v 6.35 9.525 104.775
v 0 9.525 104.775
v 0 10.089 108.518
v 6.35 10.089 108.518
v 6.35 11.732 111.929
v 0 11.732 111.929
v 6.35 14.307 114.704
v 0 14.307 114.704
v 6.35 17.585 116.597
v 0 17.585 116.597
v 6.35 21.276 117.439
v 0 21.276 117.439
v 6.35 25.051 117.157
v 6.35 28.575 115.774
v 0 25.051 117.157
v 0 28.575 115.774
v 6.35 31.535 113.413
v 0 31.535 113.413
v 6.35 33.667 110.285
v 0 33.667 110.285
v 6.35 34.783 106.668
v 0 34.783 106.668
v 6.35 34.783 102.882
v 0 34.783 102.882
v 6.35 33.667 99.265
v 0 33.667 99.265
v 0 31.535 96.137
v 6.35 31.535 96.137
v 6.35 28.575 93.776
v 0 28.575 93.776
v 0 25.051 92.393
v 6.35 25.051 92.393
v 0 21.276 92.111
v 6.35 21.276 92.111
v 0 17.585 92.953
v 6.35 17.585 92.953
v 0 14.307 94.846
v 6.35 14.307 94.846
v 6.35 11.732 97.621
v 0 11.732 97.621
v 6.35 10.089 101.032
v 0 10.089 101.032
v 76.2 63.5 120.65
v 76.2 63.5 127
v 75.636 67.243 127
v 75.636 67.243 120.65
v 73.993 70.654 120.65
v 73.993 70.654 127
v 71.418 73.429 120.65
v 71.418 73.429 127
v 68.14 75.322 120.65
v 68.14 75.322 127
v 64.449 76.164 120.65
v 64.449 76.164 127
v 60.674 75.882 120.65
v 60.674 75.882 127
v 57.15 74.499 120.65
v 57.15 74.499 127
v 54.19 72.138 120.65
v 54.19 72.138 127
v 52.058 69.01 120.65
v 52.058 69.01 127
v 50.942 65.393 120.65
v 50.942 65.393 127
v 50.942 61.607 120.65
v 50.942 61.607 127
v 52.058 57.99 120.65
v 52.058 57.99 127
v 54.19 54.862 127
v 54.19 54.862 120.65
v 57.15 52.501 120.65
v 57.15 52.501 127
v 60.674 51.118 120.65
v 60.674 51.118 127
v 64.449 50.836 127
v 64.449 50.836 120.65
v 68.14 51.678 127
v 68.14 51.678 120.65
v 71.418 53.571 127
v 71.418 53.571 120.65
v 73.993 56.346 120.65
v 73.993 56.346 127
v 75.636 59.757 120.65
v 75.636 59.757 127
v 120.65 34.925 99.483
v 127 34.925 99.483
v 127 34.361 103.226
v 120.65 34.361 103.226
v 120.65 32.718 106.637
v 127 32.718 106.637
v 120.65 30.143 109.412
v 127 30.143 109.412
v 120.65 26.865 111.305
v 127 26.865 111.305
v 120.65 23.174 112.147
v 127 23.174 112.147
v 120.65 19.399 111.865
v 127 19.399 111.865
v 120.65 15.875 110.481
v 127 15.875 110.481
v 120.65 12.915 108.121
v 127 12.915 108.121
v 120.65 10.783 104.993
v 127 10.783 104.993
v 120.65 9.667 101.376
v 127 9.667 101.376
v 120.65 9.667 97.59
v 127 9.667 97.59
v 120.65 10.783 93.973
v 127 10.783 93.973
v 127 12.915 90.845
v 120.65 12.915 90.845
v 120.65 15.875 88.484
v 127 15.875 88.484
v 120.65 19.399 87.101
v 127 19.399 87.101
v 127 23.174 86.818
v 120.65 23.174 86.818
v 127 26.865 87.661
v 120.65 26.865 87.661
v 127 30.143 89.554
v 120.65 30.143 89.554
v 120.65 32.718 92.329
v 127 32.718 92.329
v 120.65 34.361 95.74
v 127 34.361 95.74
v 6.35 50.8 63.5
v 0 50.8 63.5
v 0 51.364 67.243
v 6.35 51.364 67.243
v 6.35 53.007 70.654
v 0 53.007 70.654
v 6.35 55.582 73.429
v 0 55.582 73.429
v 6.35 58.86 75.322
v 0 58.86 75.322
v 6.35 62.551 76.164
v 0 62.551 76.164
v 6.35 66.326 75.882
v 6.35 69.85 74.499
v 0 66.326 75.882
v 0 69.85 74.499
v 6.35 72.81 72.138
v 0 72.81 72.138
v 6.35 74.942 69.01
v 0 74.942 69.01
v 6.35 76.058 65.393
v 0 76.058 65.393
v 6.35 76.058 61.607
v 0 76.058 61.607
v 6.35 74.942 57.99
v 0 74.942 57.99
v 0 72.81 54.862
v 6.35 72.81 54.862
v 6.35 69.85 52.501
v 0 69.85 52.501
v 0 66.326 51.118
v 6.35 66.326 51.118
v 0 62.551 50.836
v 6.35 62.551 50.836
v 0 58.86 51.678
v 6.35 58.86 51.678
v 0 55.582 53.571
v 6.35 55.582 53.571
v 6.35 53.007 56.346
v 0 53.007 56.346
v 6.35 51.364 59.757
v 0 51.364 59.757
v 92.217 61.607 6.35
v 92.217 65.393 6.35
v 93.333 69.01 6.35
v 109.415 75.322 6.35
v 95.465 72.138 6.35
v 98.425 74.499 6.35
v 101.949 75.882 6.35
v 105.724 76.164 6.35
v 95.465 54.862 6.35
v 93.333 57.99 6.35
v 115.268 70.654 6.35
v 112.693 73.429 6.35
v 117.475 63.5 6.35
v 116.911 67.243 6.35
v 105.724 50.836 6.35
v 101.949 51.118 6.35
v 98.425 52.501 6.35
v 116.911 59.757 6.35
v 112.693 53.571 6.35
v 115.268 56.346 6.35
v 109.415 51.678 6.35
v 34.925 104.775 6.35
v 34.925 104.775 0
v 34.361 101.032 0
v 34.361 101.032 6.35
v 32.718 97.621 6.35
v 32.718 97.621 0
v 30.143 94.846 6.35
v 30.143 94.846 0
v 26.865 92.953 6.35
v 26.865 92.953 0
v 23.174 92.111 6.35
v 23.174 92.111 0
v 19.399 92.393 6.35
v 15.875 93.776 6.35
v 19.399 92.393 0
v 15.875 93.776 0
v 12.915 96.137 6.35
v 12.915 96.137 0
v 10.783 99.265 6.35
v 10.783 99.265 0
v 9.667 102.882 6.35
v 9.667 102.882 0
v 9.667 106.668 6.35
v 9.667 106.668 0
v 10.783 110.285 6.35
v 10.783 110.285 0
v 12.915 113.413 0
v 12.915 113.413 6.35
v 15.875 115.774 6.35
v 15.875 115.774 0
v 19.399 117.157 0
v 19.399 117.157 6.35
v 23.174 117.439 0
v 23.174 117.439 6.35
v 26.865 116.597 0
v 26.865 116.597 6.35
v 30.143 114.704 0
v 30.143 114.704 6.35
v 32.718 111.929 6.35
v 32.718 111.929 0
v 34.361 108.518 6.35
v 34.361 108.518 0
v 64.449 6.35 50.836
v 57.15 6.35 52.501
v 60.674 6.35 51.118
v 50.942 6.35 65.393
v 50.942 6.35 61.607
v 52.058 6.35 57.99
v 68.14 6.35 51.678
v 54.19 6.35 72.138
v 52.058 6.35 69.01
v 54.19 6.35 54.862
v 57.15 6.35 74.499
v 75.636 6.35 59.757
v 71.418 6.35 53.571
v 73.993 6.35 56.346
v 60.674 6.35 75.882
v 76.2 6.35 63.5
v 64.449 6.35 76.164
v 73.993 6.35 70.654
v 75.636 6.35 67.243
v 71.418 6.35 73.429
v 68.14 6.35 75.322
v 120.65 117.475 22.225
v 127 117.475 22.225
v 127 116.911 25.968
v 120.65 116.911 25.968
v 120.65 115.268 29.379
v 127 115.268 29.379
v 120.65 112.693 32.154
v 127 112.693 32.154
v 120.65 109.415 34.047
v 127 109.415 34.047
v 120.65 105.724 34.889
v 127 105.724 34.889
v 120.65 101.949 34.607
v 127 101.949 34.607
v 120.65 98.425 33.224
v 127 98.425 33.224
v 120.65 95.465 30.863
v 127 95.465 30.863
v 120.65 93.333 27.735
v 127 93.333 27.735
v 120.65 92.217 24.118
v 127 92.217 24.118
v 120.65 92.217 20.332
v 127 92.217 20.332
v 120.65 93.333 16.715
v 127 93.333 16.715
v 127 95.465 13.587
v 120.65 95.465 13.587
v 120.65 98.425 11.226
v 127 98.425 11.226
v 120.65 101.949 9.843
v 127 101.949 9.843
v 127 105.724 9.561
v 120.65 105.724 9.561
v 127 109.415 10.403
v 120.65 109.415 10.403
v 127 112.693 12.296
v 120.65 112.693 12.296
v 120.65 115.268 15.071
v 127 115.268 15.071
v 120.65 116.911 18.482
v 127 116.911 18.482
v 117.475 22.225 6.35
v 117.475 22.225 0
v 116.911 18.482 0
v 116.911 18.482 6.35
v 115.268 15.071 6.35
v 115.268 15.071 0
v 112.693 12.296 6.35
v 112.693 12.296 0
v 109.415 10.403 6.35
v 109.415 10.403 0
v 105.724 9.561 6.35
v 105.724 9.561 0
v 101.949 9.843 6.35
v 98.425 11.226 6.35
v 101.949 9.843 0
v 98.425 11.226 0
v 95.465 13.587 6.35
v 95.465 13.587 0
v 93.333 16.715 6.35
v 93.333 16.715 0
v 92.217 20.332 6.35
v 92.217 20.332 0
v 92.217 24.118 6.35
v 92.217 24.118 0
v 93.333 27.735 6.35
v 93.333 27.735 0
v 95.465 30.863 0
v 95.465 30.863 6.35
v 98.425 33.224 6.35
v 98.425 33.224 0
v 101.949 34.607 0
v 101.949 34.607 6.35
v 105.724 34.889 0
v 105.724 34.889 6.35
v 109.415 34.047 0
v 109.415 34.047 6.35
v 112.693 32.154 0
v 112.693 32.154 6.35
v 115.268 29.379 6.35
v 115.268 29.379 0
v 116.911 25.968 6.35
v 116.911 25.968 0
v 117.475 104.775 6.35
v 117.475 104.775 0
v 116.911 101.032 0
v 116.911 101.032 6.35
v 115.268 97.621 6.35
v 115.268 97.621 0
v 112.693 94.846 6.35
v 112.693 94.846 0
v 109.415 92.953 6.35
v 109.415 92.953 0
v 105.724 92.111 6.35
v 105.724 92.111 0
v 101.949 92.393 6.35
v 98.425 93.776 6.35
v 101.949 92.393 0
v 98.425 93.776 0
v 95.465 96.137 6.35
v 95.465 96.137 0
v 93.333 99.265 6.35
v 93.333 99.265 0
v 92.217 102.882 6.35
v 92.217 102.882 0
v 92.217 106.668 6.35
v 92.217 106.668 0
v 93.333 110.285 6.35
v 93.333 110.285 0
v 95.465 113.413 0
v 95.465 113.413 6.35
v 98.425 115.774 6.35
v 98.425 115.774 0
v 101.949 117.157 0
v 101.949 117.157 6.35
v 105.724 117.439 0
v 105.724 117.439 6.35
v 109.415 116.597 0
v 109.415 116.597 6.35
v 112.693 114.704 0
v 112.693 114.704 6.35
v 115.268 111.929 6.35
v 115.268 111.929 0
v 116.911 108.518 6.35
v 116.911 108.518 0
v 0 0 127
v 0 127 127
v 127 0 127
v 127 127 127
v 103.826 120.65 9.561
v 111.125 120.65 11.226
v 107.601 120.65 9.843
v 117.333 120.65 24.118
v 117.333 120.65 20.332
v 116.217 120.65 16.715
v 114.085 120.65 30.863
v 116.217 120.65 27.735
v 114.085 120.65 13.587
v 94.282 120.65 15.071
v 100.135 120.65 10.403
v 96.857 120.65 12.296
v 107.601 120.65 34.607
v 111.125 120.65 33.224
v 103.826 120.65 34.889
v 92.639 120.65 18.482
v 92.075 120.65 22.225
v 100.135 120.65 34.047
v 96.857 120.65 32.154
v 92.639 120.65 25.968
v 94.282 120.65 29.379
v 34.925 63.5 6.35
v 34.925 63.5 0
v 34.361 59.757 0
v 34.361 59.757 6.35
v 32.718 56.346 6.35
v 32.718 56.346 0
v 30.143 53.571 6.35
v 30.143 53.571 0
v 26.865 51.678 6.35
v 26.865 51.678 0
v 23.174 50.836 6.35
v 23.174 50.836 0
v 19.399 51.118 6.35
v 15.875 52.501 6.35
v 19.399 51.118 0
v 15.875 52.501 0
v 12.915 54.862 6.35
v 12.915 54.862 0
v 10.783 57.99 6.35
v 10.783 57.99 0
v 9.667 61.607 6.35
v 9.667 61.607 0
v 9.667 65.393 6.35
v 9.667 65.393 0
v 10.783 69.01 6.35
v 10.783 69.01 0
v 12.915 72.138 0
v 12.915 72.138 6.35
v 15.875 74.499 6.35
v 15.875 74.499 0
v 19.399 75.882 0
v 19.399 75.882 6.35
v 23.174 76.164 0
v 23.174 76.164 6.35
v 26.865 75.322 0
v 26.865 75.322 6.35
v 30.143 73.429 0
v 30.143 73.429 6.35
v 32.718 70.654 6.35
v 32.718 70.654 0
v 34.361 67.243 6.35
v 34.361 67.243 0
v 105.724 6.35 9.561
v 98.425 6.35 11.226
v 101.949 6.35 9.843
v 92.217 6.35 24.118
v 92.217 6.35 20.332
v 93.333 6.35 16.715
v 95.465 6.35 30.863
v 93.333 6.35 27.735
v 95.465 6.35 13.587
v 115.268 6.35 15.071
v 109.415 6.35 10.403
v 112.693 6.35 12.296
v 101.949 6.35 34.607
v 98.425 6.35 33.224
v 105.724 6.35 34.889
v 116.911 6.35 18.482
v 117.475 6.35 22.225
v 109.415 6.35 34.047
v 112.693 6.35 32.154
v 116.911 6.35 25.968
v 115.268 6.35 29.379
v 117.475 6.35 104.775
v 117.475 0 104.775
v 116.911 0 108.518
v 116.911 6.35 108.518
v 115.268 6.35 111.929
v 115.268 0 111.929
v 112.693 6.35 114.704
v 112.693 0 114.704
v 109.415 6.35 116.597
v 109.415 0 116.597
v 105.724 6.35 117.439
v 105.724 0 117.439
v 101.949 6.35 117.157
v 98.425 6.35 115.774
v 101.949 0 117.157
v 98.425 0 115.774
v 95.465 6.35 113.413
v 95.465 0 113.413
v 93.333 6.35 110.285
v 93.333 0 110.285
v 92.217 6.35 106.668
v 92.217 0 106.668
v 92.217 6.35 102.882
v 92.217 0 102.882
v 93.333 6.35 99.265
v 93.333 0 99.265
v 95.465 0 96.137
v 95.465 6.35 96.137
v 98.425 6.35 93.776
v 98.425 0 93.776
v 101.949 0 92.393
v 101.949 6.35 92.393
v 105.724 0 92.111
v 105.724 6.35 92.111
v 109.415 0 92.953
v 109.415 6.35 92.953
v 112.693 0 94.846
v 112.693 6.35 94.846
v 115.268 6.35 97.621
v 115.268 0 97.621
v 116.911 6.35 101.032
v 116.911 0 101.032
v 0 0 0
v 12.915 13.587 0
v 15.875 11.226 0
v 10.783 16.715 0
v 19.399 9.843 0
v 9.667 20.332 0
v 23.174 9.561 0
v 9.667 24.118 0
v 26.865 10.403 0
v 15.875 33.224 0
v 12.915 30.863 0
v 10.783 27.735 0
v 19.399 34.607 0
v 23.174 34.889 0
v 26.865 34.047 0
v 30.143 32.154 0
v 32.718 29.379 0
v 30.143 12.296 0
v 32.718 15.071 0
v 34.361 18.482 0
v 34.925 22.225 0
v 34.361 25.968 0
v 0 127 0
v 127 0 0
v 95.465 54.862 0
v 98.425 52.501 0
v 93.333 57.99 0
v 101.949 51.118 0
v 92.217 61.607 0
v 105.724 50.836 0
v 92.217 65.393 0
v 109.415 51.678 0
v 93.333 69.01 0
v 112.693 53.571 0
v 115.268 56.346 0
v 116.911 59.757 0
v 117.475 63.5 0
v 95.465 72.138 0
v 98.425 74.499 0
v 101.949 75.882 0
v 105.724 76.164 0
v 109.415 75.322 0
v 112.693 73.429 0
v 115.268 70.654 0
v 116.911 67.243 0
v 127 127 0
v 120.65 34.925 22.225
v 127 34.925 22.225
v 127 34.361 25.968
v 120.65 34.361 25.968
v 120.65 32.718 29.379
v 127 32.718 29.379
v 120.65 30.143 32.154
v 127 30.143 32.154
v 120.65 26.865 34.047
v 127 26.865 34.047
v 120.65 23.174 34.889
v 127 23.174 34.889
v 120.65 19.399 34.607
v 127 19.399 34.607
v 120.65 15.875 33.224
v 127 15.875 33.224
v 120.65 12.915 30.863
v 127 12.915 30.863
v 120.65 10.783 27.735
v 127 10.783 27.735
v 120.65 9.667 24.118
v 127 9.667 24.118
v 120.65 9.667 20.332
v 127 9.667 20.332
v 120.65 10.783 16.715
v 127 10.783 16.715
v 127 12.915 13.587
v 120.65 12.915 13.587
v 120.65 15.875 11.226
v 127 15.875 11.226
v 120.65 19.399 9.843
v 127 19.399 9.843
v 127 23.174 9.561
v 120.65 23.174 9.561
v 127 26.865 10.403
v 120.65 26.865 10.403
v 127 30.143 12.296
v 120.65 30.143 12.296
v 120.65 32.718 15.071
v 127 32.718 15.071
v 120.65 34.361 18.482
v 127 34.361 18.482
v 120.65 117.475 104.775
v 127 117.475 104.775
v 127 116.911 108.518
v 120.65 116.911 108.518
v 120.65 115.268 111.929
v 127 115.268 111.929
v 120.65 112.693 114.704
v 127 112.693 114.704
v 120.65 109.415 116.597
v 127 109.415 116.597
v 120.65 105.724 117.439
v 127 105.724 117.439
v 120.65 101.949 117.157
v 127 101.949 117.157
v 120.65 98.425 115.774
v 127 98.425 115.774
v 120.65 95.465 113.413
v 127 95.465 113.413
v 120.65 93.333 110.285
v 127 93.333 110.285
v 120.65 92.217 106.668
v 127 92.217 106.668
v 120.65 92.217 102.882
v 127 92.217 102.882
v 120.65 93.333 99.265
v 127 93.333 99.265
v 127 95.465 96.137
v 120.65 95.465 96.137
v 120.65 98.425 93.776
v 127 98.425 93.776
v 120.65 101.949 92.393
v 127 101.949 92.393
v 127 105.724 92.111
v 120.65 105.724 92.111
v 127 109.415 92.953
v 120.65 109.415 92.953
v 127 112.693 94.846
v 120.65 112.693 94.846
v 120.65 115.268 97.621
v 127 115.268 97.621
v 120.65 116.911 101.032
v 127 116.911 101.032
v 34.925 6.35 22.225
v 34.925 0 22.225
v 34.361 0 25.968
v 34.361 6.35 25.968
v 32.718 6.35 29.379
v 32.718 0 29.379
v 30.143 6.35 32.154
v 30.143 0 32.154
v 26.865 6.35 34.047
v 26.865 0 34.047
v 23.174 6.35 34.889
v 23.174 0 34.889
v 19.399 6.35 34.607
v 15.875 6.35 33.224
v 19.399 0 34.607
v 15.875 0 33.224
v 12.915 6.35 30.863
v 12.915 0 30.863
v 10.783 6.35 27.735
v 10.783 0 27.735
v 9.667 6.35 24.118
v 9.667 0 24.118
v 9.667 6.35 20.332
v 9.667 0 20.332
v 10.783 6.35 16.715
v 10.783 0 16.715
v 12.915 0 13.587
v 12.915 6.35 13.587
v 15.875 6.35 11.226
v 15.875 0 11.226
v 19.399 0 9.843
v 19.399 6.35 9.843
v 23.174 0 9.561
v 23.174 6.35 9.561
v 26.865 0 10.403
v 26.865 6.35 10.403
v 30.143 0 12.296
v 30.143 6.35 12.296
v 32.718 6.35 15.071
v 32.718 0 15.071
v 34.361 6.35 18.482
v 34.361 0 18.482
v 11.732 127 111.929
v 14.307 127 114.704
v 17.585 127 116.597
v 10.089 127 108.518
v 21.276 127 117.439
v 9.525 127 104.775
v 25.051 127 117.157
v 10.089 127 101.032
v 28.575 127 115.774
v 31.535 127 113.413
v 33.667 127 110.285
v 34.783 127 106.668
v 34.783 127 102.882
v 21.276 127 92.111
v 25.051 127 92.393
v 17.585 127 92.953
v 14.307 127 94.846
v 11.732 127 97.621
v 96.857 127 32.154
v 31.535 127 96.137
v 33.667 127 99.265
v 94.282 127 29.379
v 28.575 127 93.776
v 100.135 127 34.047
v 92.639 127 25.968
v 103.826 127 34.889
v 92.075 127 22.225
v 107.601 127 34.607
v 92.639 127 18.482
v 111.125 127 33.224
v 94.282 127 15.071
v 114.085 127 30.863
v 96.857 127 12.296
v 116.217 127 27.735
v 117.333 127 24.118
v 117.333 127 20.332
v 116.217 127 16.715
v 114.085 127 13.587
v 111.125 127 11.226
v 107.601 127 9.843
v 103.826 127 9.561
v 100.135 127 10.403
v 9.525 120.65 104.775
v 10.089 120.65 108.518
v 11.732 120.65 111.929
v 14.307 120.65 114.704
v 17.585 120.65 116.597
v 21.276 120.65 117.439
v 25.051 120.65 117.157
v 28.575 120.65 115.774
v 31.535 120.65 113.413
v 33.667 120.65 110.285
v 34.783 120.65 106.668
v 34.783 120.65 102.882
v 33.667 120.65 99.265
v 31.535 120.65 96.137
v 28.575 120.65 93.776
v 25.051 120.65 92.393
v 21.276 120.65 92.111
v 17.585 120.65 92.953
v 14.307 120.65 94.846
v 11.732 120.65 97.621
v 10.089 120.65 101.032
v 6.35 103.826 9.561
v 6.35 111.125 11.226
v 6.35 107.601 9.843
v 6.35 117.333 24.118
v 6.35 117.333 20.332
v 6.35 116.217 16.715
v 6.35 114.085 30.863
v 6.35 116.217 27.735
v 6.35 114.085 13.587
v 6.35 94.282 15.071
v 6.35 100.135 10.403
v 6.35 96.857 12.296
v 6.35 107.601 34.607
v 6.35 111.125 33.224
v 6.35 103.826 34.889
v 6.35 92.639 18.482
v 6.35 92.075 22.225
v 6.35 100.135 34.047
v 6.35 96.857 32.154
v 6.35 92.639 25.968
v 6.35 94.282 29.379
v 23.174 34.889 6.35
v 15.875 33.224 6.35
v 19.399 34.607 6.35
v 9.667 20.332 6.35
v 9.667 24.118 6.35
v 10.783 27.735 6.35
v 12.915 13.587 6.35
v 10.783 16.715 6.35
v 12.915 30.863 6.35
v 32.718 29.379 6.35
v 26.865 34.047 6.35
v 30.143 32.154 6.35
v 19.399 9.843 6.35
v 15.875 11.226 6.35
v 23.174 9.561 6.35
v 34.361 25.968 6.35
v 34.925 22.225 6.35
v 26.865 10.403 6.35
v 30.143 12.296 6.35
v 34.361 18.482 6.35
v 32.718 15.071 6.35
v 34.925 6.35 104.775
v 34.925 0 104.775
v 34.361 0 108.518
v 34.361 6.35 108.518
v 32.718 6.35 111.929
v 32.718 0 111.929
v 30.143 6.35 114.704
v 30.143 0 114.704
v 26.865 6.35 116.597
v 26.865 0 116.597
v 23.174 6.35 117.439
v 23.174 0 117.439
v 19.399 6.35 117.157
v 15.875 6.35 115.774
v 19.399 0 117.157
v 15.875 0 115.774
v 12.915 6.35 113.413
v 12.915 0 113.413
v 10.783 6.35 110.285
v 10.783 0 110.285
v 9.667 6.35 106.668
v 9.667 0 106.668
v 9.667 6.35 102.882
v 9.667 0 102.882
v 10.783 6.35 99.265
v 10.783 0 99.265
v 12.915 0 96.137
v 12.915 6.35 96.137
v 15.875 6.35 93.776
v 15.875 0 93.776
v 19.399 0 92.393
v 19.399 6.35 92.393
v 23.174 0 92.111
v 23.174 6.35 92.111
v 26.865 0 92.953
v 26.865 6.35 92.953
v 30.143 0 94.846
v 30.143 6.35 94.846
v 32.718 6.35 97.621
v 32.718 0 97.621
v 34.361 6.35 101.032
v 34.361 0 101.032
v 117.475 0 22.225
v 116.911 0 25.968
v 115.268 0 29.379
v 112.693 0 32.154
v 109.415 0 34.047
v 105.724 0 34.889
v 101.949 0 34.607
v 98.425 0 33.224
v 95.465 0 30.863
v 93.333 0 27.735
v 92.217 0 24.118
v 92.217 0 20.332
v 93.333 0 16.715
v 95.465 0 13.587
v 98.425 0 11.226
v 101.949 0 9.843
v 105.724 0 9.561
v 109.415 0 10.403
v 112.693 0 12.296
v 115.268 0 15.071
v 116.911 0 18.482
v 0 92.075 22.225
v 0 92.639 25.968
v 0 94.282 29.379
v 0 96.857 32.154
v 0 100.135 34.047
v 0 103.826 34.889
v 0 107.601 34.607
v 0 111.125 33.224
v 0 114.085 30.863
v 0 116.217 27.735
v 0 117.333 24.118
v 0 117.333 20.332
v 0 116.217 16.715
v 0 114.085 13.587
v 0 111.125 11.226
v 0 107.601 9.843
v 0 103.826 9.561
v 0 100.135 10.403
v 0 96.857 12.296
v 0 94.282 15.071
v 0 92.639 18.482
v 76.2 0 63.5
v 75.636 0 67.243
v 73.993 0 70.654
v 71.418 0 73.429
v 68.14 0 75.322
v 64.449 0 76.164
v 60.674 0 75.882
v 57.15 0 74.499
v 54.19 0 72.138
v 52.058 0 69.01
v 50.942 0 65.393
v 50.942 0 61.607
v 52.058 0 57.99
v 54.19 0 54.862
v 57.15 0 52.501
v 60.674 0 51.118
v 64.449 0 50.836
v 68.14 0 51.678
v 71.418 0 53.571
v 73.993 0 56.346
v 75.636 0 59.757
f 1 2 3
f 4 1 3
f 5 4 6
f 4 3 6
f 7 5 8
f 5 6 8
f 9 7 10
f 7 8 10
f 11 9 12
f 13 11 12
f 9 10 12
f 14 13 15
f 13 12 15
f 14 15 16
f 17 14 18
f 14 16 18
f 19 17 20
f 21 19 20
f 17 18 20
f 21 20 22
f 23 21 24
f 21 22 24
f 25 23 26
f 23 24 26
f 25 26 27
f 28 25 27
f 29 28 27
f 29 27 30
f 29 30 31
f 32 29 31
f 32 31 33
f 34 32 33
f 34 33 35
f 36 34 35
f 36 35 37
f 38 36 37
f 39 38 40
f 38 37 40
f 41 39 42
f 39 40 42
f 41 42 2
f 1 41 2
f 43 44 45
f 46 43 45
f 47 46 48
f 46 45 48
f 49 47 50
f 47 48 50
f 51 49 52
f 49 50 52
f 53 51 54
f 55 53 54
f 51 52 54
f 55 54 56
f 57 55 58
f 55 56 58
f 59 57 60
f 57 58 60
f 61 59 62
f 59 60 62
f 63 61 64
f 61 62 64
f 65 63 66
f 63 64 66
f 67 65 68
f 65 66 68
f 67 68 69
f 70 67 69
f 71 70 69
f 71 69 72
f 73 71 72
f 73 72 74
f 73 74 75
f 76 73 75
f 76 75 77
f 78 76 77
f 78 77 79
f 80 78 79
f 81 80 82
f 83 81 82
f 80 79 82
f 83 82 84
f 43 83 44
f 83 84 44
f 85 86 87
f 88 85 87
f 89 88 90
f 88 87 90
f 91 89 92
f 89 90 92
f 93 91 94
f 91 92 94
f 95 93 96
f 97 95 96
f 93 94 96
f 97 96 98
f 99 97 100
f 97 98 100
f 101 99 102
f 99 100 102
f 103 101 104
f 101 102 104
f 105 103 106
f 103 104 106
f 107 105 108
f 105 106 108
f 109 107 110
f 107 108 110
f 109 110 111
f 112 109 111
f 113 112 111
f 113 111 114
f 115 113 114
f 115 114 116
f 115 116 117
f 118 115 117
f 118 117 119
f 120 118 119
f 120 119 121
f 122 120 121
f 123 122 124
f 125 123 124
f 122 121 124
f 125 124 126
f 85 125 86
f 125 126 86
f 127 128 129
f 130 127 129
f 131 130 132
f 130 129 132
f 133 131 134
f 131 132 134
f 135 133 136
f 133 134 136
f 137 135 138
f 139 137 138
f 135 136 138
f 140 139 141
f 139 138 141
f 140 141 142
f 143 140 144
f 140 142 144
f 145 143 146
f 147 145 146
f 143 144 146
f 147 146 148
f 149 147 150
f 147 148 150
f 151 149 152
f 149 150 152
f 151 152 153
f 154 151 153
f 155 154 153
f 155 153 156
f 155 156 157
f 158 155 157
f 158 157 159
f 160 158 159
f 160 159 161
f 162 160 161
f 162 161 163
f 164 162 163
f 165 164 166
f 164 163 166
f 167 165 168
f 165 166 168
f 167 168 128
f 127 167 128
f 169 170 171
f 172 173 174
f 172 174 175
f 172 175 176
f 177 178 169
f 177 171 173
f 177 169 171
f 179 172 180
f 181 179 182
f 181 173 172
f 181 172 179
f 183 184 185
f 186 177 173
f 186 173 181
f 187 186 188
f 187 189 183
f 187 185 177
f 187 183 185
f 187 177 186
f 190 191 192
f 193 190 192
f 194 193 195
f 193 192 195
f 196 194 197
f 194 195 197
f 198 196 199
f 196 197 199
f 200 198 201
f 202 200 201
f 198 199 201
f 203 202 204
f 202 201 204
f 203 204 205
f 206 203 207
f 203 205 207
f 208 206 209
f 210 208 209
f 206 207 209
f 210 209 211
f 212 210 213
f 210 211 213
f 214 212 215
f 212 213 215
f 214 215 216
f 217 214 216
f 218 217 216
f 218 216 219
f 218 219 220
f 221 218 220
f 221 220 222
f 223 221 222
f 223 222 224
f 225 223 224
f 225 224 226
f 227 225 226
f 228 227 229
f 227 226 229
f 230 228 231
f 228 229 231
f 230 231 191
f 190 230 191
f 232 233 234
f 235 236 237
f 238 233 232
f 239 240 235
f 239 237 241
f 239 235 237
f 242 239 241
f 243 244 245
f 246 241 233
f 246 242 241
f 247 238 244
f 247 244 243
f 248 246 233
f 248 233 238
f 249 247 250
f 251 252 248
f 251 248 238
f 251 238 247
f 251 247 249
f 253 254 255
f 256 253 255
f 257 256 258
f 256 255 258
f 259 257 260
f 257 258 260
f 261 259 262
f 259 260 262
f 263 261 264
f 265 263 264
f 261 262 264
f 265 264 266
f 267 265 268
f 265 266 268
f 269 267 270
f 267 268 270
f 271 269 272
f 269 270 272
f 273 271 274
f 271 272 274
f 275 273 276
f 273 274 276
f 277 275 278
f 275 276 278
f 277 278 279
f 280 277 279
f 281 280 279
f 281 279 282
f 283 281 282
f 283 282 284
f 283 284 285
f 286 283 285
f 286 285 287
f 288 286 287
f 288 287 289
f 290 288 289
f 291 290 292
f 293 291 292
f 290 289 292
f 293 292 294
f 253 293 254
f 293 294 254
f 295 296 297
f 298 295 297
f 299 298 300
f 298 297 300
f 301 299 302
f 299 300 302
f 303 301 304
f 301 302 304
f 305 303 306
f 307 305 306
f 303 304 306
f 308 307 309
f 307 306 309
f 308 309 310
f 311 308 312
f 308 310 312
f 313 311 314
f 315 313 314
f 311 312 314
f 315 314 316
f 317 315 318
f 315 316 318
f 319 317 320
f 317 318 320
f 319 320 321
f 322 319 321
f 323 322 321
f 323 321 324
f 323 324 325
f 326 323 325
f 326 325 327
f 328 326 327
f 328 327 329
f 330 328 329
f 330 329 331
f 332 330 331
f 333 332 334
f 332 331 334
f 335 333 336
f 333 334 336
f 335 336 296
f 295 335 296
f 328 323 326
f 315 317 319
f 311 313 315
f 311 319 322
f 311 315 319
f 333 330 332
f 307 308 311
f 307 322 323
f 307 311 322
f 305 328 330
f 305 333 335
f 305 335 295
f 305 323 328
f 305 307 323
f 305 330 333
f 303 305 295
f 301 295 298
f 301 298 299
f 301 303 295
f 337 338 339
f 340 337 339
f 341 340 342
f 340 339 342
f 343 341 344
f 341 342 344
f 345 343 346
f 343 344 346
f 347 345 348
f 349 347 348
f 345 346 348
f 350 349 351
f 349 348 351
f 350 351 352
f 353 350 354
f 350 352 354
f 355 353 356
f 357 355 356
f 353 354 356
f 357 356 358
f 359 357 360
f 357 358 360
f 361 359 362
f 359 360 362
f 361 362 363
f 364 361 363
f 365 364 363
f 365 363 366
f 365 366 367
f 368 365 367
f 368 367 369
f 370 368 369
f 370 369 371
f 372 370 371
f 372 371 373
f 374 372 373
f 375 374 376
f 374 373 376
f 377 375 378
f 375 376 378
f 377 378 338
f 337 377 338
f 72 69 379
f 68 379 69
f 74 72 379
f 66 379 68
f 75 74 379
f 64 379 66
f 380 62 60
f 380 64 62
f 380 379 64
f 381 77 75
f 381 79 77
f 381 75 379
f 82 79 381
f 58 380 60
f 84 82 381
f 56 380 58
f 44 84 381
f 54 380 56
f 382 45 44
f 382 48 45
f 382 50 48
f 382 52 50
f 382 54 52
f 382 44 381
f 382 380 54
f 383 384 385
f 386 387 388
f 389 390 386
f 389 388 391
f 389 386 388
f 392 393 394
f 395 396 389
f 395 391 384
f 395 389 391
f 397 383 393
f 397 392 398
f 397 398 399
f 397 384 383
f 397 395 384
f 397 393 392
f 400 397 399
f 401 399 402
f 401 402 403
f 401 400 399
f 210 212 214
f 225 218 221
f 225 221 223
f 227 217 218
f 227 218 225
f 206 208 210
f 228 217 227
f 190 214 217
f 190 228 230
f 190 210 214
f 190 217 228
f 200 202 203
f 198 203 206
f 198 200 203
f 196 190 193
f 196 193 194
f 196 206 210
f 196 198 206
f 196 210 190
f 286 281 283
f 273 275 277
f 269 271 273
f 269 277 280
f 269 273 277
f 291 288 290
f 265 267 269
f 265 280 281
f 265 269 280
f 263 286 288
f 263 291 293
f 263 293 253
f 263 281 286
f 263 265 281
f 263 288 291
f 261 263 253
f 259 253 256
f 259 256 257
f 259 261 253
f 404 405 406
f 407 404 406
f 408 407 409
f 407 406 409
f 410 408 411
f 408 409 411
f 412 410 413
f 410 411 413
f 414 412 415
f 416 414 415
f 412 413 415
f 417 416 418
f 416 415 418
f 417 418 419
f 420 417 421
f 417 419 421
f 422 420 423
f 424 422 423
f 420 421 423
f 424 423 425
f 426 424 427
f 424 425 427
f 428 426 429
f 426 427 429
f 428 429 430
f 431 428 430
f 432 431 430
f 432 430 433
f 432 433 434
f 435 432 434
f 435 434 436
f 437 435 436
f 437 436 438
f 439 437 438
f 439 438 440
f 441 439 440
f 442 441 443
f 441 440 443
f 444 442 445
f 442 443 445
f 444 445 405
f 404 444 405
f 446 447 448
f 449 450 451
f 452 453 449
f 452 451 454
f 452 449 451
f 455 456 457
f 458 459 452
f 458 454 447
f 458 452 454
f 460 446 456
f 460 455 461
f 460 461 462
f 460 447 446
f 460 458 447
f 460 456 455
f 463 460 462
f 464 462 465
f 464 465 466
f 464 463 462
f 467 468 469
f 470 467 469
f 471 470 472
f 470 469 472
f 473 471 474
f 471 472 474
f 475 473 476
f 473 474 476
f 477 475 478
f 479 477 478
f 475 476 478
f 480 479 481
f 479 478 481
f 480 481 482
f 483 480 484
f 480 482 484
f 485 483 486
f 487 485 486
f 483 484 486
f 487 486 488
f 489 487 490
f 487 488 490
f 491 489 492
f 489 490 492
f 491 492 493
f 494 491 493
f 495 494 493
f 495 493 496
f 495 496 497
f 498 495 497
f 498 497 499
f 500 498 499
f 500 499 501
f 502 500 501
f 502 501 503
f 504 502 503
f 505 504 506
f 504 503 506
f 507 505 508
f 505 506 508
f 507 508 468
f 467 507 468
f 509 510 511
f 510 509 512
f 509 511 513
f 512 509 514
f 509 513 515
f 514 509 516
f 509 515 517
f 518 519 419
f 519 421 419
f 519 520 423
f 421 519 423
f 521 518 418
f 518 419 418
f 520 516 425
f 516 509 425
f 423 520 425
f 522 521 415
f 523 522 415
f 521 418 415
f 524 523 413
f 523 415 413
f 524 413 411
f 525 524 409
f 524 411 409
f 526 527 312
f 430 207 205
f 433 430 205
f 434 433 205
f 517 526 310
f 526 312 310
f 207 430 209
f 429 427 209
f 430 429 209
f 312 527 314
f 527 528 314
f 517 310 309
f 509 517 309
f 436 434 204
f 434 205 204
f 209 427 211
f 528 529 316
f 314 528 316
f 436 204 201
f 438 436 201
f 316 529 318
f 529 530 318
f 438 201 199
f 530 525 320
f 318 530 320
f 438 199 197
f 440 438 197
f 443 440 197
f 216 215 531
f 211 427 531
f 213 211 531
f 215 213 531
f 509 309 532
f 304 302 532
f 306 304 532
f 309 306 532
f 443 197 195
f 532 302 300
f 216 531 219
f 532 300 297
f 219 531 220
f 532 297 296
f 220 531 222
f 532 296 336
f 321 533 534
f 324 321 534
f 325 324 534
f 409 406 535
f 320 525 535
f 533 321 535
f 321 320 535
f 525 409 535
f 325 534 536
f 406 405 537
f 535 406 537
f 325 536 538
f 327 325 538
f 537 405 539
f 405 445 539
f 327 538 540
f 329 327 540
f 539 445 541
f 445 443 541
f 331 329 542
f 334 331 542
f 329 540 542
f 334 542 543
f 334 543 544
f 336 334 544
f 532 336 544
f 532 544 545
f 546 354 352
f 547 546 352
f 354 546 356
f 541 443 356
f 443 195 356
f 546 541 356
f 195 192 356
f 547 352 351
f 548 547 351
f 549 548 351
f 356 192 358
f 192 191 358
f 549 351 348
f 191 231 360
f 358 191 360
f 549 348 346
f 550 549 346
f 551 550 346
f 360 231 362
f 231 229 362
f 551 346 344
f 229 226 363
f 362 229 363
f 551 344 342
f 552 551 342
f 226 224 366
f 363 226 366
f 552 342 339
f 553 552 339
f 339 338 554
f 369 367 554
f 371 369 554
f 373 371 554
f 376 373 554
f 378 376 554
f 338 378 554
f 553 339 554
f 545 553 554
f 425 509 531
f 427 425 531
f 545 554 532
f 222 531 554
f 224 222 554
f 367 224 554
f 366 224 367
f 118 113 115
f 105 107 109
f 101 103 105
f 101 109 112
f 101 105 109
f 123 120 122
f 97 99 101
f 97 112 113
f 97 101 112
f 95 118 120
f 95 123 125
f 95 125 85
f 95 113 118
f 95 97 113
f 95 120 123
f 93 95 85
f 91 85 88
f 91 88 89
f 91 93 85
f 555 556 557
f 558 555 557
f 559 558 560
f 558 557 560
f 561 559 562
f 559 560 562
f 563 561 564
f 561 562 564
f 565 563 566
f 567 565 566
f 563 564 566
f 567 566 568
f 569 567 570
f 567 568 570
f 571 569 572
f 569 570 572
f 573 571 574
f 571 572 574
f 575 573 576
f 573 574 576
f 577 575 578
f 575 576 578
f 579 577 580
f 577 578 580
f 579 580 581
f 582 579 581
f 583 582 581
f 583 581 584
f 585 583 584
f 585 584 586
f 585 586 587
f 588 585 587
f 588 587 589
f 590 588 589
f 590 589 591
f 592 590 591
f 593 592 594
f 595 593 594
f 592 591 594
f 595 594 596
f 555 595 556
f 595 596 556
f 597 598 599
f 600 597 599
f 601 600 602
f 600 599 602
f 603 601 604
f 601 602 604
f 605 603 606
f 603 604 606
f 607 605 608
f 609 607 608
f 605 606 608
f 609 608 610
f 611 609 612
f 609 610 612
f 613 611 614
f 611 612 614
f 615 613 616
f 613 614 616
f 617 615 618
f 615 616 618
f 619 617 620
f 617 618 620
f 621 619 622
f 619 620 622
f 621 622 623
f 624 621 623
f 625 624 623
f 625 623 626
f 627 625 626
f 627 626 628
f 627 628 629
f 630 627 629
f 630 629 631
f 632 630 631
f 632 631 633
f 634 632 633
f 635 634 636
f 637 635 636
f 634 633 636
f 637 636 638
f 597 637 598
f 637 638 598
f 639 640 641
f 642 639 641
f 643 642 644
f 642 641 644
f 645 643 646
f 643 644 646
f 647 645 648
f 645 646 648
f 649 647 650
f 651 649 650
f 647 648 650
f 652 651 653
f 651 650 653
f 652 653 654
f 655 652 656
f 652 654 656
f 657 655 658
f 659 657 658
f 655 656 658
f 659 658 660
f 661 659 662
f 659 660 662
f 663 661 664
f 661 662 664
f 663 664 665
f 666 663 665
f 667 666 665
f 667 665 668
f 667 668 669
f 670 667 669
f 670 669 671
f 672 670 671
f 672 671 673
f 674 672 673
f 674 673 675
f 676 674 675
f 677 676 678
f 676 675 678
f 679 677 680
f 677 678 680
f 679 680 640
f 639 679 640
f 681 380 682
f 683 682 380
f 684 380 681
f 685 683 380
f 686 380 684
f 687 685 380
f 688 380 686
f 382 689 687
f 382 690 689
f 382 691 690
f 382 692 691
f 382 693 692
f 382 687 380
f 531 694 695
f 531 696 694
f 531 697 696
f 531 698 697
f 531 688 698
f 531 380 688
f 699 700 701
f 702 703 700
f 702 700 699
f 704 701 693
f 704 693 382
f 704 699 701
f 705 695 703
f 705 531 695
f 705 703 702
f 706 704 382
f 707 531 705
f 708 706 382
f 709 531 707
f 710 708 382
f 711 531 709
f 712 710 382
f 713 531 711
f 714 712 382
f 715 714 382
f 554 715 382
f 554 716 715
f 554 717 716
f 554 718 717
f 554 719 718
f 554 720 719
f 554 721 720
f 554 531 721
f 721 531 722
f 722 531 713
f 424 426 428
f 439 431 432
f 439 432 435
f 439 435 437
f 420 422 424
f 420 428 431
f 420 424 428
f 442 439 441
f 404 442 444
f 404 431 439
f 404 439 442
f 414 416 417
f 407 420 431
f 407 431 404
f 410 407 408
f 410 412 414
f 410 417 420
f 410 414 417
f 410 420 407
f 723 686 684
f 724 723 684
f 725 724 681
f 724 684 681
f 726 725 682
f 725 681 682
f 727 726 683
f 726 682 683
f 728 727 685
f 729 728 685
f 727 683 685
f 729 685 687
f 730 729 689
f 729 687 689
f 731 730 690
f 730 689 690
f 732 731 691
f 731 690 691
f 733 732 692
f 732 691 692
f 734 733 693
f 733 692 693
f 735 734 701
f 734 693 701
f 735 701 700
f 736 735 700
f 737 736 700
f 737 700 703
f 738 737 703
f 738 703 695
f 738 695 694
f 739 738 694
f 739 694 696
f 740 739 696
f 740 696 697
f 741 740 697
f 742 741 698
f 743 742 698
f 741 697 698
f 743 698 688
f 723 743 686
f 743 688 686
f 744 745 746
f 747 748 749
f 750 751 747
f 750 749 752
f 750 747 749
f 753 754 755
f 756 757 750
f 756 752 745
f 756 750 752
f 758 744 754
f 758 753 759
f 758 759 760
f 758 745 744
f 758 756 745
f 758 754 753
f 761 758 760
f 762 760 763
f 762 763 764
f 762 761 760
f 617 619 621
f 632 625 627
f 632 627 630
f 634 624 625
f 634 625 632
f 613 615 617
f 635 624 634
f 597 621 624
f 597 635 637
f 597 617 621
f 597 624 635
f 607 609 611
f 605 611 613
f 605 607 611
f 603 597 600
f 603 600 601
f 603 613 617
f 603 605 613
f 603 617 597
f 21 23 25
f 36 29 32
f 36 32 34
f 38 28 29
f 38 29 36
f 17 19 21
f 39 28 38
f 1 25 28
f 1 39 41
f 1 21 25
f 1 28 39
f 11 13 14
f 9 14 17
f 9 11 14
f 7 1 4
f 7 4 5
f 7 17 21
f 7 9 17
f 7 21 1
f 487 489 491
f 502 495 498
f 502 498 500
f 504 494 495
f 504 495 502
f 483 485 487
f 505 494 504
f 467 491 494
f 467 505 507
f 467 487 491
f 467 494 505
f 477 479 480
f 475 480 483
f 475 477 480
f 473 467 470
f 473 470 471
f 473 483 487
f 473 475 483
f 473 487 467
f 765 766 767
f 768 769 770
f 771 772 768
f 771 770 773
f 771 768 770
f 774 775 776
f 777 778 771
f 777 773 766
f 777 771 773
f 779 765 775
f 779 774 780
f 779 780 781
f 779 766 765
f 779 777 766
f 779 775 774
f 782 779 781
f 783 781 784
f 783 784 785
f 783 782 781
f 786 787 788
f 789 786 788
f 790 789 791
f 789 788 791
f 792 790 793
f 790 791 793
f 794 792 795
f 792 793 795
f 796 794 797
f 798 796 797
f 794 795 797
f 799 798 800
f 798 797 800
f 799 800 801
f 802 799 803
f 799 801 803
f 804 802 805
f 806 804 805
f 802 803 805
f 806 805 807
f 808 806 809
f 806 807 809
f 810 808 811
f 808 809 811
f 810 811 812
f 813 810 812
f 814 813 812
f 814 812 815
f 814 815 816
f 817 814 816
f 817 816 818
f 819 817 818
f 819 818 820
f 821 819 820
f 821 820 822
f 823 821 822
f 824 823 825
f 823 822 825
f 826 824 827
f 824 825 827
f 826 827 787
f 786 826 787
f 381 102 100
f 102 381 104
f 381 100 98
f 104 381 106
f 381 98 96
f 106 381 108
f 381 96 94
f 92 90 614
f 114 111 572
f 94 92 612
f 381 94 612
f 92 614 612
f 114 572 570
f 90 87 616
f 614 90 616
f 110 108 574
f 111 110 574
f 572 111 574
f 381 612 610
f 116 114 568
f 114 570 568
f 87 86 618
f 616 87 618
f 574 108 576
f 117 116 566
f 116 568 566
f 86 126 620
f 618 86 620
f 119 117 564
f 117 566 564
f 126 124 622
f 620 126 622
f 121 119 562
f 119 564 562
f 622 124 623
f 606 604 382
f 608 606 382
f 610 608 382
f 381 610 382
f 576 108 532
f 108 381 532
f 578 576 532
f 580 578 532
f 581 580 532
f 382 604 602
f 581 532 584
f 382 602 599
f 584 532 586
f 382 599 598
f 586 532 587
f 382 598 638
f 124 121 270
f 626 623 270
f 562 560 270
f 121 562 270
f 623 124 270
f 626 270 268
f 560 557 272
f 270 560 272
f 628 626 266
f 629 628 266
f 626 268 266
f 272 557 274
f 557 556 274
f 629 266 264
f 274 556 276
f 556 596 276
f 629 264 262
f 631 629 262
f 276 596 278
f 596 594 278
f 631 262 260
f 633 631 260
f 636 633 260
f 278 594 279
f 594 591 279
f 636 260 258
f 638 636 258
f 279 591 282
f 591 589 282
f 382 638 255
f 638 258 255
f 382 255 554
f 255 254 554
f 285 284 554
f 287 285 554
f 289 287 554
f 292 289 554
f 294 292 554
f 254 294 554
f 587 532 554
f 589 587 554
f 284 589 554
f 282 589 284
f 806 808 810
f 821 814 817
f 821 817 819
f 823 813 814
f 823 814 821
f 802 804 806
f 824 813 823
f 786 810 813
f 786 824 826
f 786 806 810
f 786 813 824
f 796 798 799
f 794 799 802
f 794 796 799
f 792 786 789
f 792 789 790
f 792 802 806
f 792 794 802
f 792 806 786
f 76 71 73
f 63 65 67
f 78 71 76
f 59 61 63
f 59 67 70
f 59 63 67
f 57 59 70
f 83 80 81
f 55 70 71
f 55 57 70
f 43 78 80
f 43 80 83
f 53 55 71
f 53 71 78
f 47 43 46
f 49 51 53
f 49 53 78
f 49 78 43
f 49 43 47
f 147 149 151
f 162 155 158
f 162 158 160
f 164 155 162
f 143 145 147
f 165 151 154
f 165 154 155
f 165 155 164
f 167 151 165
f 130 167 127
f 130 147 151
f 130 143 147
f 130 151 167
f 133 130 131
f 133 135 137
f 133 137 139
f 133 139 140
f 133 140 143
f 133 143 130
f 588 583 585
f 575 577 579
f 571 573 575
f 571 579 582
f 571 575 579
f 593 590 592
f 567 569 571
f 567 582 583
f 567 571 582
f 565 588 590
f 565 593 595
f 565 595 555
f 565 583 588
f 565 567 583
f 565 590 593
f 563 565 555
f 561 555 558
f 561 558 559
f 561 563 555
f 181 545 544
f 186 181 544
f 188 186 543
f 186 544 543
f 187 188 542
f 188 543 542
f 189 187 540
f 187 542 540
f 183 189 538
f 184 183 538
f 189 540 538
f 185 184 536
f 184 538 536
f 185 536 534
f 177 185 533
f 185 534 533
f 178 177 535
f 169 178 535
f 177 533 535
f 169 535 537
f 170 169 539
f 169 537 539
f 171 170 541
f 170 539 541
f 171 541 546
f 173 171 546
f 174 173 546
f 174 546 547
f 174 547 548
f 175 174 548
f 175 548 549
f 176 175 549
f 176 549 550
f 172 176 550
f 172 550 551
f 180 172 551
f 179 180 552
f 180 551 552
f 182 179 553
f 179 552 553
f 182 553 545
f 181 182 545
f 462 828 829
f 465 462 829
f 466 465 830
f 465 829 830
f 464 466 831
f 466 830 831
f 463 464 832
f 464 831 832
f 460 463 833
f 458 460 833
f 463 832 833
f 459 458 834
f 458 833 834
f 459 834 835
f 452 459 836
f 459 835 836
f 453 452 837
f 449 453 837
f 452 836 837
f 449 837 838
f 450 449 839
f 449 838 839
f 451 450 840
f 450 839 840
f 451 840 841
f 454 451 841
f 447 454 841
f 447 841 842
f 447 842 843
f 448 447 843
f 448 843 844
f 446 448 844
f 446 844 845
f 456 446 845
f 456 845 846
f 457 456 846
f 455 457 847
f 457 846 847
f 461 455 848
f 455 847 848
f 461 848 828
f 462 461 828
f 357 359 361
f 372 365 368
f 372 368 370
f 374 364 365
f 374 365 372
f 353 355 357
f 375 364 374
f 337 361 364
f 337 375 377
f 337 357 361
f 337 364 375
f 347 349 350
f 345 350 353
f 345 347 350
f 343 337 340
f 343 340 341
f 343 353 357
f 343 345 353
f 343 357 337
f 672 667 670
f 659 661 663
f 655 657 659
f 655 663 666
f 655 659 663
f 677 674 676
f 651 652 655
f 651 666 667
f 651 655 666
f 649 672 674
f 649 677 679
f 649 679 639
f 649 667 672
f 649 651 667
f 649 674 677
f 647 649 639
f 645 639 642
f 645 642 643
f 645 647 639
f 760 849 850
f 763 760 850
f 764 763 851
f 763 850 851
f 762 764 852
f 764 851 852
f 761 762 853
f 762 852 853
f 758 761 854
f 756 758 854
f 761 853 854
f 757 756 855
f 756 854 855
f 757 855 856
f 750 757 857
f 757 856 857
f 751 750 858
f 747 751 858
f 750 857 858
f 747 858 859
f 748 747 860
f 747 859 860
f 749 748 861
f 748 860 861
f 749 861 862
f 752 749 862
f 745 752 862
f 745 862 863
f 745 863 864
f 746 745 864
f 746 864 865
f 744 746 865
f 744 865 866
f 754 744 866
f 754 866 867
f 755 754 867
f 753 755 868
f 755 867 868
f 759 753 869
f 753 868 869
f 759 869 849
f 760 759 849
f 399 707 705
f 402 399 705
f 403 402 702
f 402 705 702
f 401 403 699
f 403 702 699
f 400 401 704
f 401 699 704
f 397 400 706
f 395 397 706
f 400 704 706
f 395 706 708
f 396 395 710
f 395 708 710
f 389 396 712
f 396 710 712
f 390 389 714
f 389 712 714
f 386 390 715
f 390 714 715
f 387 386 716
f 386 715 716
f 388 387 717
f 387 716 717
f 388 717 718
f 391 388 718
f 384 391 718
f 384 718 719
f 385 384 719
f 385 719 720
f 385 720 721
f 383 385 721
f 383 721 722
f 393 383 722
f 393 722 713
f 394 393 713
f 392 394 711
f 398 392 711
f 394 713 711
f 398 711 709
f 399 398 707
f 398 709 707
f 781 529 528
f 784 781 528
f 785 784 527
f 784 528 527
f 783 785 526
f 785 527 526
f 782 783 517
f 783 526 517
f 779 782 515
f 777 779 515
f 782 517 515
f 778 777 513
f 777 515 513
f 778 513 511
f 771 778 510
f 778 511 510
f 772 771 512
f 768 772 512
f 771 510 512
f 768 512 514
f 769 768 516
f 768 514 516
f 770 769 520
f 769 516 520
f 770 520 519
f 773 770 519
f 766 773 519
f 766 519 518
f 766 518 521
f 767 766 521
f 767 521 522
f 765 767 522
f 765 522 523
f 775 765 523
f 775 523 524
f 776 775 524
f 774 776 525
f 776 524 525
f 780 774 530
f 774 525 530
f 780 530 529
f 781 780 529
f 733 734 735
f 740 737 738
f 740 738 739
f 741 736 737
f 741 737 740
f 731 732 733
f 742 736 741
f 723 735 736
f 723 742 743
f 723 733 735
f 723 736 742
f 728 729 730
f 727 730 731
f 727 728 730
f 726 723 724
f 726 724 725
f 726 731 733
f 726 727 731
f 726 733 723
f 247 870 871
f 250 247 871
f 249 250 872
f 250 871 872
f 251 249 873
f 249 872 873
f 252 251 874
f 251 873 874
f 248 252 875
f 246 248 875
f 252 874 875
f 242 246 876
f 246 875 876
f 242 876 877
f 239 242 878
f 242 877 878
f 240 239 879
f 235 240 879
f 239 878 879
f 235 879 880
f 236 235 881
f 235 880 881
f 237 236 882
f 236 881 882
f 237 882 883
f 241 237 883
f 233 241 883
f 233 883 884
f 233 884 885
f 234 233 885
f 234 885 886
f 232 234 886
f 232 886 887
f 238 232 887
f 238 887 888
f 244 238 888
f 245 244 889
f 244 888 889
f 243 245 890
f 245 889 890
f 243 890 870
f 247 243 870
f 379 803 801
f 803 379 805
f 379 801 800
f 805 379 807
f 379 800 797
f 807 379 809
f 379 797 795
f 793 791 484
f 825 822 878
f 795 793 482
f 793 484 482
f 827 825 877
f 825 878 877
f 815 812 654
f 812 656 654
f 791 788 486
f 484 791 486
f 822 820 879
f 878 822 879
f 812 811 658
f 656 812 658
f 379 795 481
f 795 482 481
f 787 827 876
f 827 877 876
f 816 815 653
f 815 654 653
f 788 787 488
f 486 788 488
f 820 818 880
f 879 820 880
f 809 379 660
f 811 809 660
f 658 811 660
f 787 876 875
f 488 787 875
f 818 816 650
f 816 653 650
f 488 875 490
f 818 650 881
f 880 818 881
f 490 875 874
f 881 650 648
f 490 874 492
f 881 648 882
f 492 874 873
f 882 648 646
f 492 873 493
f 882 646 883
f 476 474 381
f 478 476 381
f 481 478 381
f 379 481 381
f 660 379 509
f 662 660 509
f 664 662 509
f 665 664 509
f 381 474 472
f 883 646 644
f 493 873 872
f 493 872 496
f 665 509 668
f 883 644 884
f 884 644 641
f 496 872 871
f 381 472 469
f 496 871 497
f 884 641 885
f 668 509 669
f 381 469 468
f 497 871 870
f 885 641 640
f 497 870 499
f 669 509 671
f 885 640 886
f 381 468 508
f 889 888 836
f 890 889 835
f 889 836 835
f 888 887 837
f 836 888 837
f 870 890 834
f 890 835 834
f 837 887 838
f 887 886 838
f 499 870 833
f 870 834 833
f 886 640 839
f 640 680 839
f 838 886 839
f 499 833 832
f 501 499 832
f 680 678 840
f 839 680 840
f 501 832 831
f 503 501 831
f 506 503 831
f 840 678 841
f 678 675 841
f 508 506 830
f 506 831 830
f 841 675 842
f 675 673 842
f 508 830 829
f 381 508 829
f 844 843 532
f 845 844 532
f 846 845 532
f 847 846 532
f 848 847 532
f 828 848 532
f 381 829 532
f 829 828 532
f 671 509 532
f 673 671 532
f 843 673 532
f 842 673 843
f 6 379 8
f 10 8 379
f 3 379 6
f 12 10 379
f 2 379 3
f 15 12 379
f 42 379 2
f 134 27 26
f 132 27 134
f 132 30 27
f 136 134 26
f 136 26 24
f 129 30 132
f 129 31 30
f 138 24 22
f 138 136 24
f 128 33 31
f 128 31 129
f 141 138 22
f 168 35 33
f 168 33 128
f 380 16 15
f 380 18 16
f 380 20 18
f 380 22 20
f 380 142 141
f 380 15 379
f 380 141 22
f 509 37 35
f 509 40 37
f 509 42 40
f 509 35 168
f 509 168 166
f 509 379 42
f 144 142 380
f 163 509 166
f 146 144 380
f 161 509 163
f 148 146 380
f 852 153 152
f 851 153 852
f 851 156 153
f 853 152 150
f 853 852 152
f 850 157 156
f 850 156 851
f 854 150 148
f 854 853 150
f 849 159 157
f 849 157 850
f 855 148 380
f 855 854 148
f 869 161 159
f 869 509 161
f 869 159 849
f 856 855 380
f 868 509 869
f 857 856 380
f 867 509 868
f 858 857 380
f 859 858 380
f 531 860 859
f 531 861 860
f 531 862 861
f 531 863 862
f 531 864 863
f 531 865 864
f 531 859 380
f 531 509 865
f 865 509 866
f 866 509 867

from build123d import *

# Parameters (mm, degrees)
F0_W      = 127
F0_H      = 127
F1_DEPTH  = 127
F2_R      = 12.7
F3_DEPTH  = 6.35
F4_R      = 12.7
F5_DEPTH  = 6.35
F6_R      = 12.7
F7_DEPTH  = 6.35
F8_R      = 12.7
F9_DEPTH  = 6.35
F10_R     = 12.7
F11_DEPTH = 6.35
F12_R     = 12.7
F13_DEPTH = 6.35


with BuildPart() as f1:
    # F0 (on Top) → F1 (new body)
    with BuildSketch(Plane.XY):
        with Locations((63.5, 63.5)):
            Rectangle(F0_W, F0_H)
    extrude(amount=F1_DEPTH)

    # F2 (on face) → F3 (cut)
    with BuildSketch(Plane.XY.offset(127)):
        with Locations((63.5, 63.5)):
            Circle(F2_R)
    extrude(amount=-F3_DEPTH, mode=Mode.SUBTRACT)

    # F4 (on face) → F5 (cut)
    with BuildSketch(Plane(origin=(0, 127, 0), x_dir=(-1, 0, 0), z_dir=(0, 1, 0))):
        with Locations((-104.775, 22.225)):
            Circle(F4_R)
        with Locations((-22.225, 104.775)):
            Circle(F4_R)
    extrude(amount=-F5_DEPTH, mode=Mode.SUBTRACT)

    # F6 (on face) → F7 (cut)
    with BuildSketch(Plane(origin=(0, 0, 0), x_dir=(0, -1, 0), z_dir=(-1, 0, 0))):
        with Locations((-104.775, 22.225)):
            Circle(F6_R)
        with Locations((-63.5, 63.5)):
            Circle(F6_R)
        with Locations((-22.225, 104.775)):
            Circle(F6_R)
    extrude(amount=-F7_DEPTH, mode=Mode.SUBTRACT)

    # F8 (on face) → F9 (cut)
    with BuildSketch(Plane.YZ.offset(127)):
        with Locations((22.225, 99.482931)):
            Circle(F8_R)
        with Locations((104.775, 104.775)):
            Circle(F8_R)
        with Locations((104.775, 22.225)):
            Circle(F8_R)
        with Locations((22.225, 22.225)):
            Circle(F8_R)
    extrude(amount=-F9_DEPTH, mode=Mode.SUBTRACT)

    # F10 (on face) → F11 (cut)
    with BuildSketch(Plane.XZ):
        with Locations((104.775, 104.775)):
            Circle(F10_R)
        with Locations((104.775, 22.225)):
            Circle(F10_R)
        with Locations((22.225, 22.225)):
            Circle(F10_R)
        with Locations((63.5, 63.5)):
            Circle(F10_R)
        with Locations((22.225, 104.775)):
            Circle(F10_R)
    extrude(amount=-F11_DEPTH, mode=Mode.SUBTRACT)

    # F12 (on face) → F13 (cut)
    with BuildSketch(Plane(origin=(0, 0, 0), x_dir=(1, 0, 0), z_dir=(0, 0, -1))):
        with Locations((22.225, -22.225)):
            Circle(F12_R)
        with Locations((22.225, -63.5)):
            Circle(F12_R)
        with Locations((22.225, -104.775)):
            Circle(F12_R)
        with Locations((104.775, -22.225)):
            Circle(F12_R)
        with Locations((104.775, -63.5)):
            Circle(F12_R)
        with Locations((104.775, -104.775)):
            Circle(F12_R)
    extrude(amount=-F13_DEPTH, mode=Mode.SUBTRACT)


solid = f1.part
